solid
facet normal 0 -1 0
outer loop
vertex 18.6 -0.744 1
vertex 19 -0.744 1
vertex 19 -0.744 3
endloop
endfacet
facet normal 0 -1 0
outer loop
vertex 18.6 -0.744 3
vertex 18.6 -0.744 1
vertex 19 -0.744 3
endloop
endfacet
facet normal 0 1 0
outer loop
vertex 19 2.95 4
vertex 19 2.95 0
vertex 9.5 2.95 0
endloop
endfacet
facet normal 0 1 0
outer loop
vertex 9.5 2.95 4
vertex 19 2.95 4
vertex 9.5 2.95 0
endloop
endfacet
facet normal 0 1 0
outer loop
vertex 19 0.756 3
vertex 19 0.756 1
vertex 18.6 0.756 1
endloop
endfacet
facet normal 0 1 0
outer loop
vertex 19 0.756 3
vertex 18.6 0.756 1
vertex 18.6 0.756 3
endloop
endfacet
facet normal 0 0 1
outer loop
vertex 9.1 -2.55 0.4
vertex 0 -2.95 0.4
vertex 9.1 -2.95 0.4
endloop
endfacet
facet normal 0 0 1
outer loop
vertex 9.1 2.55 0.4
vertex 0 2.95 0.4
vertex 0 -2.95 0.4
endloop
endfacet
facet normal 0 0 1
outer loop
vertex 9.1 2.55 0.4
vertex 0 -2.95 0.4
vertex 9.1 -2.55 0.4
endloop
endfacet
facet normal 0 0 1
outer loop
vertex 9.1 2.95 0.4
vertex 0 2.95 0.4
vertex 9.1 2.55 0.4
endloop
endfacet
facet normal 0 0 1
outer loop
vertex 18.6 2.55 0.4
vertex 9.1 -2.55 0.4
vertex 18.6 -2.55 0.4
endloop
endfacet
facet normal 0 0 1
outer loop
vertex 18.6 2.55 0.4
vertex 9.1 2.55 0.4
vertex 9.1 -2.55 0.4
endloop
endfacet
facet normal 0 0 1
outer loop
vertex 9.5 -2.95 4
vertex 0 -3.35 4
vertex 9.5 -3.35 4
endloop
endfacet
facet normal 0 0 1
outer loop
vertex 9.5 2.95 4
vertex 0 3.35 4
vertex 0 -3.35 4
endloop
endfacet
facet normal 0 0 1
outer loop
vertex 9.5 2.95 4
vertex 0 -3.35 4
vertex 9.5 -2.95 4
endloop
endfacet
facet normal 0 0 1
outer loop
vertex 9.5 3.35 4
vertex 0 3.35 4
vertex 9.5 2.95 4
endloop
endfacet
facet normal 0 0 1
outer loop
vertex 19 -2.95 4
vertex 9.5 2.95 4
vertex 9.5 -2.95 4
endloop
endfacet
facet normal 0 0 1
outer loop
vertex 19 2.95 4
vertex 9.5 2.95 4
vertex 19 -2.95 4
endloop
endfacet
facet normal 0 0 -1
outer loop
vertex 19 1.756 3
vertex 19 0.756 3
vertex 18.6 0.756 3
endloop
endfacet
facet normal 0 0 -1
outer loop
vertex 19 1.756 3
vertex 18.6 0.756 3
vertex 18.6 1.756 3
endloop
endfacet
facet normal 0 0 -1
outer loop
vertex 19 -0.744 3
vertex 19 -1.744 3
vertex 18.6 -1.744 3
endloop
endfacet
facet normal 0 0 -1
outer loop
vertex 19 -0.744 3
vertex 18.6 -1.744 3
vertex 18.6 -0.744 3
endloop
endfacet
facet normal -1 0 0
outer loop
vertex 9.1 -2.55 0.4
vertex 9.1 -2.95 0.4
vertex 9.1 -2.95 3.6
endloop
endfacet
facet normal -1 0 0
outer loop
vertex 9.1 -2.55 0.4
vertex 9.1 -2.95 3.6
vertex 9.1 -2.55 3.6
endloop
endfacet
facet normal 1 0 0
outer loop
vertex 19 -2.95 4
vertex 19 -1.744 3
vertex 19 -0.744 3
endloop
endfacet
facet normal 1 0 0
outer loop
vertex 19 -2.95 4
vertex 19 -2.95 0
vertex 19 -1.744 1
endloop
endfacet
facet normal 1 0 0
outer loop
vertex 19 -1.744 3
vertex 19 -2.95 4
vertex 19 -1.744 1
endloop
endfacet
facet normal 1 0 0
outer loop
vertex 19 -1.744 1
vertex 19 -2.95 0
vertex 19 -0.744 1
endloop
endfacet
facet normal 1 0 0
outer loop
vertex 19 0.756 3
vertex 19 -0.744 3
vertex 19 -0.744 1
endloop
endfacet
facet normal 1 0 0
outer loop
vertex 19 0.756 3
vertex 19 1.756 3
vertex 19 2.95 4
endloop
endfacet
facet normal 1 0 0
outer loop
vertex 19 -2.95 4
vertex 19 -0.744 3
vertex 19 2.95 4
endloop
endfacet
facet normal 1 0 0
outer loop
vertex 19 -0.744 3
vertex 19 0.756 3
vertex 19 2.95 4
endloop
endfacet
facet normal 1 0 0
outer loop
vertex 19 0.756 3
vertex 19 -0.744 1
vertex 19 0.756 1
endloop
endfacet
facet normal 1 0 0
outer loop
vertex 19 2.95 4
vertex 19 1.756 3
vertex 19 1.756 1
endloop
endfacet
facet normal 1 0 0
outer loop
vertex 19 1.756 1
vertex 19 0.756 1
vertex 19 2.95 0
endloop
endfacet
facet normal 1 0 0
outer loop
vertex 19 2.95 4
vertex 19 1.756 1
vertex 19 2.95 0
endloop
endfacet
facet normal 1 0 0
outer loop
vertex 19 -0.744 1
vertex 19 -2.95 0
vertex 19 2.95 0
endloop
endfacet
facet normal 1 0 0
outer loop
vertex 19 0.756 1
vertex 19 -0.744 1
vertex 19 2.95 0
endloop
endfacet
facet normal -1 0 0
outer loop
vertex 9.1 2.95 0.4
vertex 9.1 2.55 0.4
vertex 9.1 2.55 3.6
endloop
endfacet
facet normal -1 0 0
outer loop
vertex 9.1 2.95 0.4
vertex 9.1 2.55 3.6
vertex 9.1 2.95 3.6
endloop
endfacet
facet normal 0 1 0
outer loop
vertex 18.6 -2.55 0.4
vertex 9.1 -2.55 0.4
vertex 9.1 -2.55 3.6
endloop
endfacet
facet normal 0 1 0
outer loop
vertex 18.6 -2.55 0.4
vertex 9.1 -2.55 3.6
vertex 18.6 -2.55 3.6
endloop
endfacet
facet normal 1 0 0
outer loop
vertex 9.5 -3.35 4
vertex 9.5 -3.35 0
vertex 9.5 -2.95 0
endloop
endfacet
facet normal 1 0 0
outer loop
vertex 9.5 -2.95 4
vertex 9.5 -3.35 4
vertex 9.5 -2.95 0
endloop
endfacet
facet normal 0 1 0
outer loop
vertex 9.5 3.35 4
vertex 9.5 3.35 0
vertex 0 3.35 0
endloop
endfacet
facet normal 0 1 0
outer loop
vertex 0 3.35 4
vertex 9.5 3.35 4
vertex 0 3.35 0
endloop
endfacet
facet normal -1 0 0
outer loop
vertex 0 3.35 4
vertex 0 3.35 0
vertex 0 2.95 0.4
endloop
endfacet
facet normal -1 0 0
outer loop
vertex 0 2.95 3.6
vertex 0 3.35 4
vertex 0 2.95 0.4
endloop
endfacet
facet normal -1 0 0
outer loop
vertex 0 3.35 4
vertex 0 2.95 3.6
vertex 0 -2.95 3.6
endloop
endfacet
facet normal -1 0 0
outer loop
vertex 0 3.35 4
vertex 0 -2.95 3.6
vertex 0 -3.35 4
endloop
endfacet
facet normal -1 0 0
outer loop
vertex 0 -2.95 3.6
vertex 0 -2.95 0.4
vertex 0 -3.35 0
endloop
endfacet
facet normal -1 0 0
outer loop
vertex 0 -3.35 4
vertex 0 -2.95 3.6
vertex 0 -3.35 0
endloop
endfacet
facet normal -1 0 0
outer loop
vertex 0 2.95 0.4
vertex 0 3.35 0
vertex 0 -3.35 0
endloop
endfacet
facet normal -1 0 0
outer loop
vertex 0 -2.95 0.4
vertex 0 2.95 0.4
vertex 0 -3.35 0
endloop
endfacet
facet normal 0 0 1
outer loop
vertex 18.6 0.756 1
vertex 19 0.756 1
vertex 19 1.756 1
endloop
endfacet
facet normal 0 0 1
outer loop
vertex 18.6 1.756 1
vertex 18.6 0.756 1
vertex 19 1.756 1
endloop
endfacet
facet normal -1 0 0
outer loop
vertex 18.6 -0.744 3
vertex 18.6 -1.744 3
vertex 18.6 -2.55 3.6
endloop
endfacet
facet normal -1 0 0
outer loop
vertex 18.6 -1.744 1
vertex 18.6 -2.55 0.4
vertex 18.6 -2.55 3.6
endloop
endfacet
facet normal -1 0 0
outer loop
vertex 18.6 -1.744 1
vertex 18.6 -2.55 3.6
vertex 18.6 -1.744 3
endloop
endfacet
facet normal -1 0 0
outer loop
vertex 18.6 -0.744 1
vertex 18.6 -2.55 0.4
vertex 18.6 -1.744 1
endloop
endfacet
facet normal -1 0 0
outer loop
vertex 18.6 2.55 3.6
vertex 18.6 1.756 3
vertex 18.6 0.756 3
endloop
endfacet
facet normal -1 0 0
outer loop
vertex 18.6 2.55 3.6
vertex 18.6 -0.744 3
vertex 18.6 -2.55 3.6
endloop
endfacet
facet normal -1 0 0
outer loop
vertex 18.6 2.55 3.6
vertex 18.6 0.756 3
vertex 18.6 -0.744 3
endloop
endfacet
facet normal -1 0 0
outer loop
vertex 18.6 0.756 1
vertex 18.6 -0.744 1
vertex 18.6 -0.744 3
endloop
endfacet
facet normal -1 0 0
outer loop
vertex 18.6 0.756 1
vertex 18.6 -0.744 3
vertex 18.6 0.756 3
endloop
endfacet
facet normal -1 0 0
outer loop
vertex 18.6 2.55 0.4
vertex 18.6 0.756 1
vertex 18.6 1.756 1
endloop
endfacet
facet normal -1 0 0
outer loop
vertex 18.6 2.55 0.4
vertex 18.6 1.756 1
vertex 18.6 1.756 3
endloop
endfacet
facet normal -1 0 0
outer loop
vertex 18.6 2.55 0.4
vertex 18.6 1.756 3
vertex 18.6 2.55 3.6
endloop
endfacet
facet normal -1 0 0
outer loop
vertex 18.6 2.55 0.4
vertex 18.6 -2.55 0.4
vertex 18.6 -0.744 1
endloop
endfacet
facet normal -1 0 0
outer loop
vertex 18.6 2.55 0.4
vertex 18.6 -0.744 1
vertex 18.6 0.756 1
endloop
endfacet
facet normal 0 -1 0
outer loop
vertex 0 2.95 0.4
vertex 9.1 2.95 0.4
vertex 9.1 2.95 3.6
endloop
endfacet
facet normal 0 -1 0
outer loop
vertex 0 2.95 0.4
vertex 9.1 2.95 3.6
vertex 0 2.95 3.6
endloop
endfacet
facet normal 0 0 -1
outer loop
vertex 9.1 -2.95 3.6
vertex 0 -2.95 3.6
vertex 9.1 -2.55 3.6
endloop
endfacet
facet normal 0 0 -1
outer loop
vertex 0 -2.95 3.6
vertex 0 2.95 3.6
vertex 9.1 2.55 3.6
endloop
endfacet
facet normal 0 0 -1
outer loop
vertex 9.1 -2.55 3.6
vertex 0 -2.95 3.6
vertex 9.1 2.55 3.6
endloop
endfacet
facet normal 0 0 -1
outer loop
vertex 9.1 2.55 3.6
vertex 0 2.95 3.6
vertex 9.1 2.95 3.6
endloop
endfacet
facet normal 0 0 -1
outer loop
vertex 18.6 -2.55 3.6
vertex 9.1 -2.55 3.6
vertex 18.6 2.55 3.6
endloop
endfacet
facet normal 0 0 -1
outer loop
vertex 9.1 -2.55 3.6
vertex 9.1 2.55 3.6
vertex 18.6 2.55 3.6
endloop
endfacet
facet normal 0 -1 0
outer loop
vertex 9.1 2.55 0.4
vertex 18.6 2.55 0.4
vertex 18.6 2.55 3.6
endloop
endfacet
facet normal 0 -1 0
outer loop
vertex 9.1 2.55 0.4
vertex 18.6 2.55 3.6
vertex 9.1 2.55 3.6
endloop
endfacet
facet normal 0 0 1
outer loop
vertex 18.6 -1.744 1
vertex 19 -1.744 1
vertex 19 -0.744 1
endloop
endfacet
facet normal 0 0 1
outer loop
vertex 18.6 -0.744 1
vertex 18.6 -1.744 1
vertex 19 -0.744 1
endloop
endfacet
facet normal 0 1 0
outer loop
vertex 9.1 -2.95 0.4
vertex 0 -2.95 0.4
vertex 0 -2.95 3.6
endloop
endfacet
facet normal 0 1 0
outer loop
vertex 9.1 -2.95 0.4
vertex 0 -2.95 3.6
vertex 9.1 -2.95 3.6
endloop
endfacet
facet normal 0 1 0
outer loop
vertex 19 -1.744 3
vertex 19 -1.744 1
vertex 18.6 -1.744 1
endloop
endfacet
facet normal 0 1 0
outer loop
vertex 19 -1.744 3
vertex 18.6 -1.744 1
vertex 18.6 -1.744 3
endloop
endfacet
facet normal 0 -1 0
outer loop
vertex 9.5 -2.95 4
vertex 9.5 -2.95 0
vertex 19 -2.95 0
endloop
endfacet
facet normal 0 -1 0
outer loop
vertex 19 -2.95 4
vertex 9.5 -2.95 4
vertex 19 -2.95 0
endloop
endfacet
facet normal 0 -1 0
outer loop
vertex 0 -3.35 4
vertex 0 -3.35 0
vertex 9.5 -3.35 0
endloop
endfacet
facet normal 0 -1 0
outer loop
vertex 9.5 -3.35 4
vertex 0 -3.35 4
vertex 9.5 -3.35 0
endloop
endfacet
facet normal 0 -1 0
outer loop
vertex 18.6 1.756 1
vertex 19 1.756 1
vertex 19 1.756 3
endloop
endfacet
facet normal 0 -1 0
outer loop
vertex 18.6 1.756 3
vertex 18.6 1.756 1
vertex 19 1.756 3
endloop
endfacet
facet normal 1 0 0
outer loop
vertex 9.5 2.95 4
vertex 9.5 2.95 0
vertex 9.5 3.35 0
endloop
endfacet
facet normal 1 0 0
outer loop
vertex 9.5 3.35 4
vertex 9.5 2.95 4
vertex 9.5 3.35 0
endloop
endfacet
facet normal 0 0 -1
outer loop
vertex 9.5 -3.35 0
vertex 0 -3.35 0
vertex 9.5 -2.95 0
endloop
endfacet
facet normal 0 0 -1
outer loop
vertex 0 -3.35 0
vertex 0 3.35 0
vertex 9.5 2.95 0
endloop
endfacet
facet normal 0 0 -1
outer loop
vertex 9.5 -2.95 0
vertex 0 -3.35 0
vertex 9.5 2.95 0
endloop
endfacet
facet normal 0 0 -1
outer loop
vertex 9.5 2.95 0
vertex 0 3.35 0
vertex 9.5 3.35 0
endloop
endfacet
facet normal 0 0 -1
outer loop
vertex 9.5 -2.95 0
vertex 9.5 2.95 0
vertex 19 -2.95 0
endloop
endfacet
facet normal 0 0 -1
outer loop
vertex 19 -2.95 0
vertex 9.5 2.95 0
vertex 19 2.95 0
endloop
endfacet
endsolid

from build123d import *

# Parameters (mm, degrees)
F1_DEPTH = 4
F2_T     = -0.4
F3_W     = 1
F3_H     = 2
F4_DEPTH = 0.4


with BuildPart() as f1:
    # F0 (on Top) → F1 (new body)
    with BuildSketch(Plane.XY):
        Polygon((0, 3.35), (0, -3.35), (9.5, -3.35), (9.5, -2.95), (19, -2.95), (19, 2.95), (9.5, 2.95), (9.5, 3.35), align=None)
    extrude(amount=F1_DEPTH)

    # F2
    f2_openings = [f1.faces().sort_by_distance(p)[0] for p in [
        (0, 0, 2),
    ]]
    offset(amount=F2_T, openings=f2_openings, kind=Kind.INTERSECTION)

    # F3 (on face) → F4 (cut, through all)
    with BuildSketch(Plane.YZ.offset(19)):
        with Locations((-1.2436551969, 2)):
            Rectangle(F3_W, F3_H)
        with Locations((1.2563448031, 2)):
            Rectangle(F3_W, F3_H)
    extrude(amount=-F4_DEPTH, mode=Mode.SUBTRACT)


solid = f1.part
